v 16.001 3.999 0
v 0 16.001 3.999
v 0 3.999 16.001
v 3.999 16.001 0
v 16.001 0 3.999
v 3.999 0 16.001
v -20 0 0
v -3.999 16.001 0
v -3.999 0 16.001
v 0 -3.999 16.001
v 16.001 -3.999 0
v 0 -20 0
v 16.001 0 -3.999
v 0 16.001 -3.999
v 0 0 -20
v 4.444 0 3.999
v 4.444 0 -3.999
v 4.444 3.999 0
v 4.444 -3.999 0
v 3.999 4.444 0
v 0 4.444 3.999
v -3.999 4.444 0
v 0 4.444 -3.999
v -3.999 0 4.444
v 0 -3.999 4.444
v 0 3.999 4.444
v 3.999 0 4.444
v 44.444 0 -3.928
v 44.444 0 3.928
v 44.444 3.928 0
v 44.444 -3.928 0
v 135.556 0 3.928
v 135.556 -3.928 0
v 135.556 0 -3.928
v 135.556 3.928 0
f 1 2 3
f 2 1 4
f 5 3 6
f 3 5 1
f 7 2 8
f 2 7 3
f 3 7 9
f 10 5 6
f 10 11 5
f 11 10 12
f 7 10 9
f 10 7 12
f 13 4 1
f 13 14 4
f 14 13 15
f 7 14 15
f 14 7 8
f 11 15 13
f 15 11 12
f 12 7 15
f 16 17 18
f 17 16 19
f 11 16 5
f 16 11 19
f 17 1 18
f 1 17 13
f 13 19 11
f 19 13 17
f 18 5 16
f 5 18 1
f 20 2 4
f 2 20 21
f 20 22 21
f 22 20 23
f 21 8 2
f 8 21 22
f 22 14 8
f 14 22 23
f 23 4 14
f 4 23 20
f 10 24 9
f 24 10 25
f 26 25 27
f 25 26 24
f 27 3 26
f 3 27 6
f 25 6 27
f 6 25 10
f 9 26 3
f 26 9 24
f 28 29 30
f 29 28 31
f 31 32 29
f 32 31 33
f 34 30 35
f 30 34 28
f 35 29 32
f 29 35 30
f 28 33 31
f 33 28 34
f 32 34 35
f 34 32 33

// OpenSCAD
Cube_Size = 100;
Tolerance = 0.1;

Diamond_Size = Cube_Size * 2 / 5; // Derived from model: * 0.399943
Bar_Size = Cube_Size / 18;        // Derived from model: * 0.0565657
Bar_Offset = Diamond_Size / 9;


/*
scale(50)
	translate([1,1,1])
		translate([-9.625, -0.125, 14.875])
			import("subspace.stl", convexity=5);
*/


module bar() {
	rotate(45, [1,0,0])
		translate([Bar_Offset, -Bar_Size/2, -Bar_Size/2])
			cube([Cube_Size-Bar_Offset*2, Bar_Size, Bar_Size]);
}

module bar_hole() {
	w = Bar_Size + Tolerance;
	rotate(45, [1,0,0])
		translate([Bar_Offset, -w/2, -w/2])
			cube([Diamond_Size, w, w]);
}

module diamond() {
	cylinder(d1=Diamond_Size, d2=0, h=Diamond_Size/2, $fn=4);

	translate([0, 0, -Diamond_Size/2])
		cylinder(d1=0, d2=Diamond_Size, h=Diamond_Size/2, $fn=4);
}

module diamond_holes() {
	bar_hole();
	rotate(90, [0, 0, 1])
		bar_hole();
	rotate(-90, [0, 1, 0])
		bar_hole();
}

translate([Diamond_Size, 0, 0])
	bar();

difference() {
	diamond();
	diamond_holes();
}
